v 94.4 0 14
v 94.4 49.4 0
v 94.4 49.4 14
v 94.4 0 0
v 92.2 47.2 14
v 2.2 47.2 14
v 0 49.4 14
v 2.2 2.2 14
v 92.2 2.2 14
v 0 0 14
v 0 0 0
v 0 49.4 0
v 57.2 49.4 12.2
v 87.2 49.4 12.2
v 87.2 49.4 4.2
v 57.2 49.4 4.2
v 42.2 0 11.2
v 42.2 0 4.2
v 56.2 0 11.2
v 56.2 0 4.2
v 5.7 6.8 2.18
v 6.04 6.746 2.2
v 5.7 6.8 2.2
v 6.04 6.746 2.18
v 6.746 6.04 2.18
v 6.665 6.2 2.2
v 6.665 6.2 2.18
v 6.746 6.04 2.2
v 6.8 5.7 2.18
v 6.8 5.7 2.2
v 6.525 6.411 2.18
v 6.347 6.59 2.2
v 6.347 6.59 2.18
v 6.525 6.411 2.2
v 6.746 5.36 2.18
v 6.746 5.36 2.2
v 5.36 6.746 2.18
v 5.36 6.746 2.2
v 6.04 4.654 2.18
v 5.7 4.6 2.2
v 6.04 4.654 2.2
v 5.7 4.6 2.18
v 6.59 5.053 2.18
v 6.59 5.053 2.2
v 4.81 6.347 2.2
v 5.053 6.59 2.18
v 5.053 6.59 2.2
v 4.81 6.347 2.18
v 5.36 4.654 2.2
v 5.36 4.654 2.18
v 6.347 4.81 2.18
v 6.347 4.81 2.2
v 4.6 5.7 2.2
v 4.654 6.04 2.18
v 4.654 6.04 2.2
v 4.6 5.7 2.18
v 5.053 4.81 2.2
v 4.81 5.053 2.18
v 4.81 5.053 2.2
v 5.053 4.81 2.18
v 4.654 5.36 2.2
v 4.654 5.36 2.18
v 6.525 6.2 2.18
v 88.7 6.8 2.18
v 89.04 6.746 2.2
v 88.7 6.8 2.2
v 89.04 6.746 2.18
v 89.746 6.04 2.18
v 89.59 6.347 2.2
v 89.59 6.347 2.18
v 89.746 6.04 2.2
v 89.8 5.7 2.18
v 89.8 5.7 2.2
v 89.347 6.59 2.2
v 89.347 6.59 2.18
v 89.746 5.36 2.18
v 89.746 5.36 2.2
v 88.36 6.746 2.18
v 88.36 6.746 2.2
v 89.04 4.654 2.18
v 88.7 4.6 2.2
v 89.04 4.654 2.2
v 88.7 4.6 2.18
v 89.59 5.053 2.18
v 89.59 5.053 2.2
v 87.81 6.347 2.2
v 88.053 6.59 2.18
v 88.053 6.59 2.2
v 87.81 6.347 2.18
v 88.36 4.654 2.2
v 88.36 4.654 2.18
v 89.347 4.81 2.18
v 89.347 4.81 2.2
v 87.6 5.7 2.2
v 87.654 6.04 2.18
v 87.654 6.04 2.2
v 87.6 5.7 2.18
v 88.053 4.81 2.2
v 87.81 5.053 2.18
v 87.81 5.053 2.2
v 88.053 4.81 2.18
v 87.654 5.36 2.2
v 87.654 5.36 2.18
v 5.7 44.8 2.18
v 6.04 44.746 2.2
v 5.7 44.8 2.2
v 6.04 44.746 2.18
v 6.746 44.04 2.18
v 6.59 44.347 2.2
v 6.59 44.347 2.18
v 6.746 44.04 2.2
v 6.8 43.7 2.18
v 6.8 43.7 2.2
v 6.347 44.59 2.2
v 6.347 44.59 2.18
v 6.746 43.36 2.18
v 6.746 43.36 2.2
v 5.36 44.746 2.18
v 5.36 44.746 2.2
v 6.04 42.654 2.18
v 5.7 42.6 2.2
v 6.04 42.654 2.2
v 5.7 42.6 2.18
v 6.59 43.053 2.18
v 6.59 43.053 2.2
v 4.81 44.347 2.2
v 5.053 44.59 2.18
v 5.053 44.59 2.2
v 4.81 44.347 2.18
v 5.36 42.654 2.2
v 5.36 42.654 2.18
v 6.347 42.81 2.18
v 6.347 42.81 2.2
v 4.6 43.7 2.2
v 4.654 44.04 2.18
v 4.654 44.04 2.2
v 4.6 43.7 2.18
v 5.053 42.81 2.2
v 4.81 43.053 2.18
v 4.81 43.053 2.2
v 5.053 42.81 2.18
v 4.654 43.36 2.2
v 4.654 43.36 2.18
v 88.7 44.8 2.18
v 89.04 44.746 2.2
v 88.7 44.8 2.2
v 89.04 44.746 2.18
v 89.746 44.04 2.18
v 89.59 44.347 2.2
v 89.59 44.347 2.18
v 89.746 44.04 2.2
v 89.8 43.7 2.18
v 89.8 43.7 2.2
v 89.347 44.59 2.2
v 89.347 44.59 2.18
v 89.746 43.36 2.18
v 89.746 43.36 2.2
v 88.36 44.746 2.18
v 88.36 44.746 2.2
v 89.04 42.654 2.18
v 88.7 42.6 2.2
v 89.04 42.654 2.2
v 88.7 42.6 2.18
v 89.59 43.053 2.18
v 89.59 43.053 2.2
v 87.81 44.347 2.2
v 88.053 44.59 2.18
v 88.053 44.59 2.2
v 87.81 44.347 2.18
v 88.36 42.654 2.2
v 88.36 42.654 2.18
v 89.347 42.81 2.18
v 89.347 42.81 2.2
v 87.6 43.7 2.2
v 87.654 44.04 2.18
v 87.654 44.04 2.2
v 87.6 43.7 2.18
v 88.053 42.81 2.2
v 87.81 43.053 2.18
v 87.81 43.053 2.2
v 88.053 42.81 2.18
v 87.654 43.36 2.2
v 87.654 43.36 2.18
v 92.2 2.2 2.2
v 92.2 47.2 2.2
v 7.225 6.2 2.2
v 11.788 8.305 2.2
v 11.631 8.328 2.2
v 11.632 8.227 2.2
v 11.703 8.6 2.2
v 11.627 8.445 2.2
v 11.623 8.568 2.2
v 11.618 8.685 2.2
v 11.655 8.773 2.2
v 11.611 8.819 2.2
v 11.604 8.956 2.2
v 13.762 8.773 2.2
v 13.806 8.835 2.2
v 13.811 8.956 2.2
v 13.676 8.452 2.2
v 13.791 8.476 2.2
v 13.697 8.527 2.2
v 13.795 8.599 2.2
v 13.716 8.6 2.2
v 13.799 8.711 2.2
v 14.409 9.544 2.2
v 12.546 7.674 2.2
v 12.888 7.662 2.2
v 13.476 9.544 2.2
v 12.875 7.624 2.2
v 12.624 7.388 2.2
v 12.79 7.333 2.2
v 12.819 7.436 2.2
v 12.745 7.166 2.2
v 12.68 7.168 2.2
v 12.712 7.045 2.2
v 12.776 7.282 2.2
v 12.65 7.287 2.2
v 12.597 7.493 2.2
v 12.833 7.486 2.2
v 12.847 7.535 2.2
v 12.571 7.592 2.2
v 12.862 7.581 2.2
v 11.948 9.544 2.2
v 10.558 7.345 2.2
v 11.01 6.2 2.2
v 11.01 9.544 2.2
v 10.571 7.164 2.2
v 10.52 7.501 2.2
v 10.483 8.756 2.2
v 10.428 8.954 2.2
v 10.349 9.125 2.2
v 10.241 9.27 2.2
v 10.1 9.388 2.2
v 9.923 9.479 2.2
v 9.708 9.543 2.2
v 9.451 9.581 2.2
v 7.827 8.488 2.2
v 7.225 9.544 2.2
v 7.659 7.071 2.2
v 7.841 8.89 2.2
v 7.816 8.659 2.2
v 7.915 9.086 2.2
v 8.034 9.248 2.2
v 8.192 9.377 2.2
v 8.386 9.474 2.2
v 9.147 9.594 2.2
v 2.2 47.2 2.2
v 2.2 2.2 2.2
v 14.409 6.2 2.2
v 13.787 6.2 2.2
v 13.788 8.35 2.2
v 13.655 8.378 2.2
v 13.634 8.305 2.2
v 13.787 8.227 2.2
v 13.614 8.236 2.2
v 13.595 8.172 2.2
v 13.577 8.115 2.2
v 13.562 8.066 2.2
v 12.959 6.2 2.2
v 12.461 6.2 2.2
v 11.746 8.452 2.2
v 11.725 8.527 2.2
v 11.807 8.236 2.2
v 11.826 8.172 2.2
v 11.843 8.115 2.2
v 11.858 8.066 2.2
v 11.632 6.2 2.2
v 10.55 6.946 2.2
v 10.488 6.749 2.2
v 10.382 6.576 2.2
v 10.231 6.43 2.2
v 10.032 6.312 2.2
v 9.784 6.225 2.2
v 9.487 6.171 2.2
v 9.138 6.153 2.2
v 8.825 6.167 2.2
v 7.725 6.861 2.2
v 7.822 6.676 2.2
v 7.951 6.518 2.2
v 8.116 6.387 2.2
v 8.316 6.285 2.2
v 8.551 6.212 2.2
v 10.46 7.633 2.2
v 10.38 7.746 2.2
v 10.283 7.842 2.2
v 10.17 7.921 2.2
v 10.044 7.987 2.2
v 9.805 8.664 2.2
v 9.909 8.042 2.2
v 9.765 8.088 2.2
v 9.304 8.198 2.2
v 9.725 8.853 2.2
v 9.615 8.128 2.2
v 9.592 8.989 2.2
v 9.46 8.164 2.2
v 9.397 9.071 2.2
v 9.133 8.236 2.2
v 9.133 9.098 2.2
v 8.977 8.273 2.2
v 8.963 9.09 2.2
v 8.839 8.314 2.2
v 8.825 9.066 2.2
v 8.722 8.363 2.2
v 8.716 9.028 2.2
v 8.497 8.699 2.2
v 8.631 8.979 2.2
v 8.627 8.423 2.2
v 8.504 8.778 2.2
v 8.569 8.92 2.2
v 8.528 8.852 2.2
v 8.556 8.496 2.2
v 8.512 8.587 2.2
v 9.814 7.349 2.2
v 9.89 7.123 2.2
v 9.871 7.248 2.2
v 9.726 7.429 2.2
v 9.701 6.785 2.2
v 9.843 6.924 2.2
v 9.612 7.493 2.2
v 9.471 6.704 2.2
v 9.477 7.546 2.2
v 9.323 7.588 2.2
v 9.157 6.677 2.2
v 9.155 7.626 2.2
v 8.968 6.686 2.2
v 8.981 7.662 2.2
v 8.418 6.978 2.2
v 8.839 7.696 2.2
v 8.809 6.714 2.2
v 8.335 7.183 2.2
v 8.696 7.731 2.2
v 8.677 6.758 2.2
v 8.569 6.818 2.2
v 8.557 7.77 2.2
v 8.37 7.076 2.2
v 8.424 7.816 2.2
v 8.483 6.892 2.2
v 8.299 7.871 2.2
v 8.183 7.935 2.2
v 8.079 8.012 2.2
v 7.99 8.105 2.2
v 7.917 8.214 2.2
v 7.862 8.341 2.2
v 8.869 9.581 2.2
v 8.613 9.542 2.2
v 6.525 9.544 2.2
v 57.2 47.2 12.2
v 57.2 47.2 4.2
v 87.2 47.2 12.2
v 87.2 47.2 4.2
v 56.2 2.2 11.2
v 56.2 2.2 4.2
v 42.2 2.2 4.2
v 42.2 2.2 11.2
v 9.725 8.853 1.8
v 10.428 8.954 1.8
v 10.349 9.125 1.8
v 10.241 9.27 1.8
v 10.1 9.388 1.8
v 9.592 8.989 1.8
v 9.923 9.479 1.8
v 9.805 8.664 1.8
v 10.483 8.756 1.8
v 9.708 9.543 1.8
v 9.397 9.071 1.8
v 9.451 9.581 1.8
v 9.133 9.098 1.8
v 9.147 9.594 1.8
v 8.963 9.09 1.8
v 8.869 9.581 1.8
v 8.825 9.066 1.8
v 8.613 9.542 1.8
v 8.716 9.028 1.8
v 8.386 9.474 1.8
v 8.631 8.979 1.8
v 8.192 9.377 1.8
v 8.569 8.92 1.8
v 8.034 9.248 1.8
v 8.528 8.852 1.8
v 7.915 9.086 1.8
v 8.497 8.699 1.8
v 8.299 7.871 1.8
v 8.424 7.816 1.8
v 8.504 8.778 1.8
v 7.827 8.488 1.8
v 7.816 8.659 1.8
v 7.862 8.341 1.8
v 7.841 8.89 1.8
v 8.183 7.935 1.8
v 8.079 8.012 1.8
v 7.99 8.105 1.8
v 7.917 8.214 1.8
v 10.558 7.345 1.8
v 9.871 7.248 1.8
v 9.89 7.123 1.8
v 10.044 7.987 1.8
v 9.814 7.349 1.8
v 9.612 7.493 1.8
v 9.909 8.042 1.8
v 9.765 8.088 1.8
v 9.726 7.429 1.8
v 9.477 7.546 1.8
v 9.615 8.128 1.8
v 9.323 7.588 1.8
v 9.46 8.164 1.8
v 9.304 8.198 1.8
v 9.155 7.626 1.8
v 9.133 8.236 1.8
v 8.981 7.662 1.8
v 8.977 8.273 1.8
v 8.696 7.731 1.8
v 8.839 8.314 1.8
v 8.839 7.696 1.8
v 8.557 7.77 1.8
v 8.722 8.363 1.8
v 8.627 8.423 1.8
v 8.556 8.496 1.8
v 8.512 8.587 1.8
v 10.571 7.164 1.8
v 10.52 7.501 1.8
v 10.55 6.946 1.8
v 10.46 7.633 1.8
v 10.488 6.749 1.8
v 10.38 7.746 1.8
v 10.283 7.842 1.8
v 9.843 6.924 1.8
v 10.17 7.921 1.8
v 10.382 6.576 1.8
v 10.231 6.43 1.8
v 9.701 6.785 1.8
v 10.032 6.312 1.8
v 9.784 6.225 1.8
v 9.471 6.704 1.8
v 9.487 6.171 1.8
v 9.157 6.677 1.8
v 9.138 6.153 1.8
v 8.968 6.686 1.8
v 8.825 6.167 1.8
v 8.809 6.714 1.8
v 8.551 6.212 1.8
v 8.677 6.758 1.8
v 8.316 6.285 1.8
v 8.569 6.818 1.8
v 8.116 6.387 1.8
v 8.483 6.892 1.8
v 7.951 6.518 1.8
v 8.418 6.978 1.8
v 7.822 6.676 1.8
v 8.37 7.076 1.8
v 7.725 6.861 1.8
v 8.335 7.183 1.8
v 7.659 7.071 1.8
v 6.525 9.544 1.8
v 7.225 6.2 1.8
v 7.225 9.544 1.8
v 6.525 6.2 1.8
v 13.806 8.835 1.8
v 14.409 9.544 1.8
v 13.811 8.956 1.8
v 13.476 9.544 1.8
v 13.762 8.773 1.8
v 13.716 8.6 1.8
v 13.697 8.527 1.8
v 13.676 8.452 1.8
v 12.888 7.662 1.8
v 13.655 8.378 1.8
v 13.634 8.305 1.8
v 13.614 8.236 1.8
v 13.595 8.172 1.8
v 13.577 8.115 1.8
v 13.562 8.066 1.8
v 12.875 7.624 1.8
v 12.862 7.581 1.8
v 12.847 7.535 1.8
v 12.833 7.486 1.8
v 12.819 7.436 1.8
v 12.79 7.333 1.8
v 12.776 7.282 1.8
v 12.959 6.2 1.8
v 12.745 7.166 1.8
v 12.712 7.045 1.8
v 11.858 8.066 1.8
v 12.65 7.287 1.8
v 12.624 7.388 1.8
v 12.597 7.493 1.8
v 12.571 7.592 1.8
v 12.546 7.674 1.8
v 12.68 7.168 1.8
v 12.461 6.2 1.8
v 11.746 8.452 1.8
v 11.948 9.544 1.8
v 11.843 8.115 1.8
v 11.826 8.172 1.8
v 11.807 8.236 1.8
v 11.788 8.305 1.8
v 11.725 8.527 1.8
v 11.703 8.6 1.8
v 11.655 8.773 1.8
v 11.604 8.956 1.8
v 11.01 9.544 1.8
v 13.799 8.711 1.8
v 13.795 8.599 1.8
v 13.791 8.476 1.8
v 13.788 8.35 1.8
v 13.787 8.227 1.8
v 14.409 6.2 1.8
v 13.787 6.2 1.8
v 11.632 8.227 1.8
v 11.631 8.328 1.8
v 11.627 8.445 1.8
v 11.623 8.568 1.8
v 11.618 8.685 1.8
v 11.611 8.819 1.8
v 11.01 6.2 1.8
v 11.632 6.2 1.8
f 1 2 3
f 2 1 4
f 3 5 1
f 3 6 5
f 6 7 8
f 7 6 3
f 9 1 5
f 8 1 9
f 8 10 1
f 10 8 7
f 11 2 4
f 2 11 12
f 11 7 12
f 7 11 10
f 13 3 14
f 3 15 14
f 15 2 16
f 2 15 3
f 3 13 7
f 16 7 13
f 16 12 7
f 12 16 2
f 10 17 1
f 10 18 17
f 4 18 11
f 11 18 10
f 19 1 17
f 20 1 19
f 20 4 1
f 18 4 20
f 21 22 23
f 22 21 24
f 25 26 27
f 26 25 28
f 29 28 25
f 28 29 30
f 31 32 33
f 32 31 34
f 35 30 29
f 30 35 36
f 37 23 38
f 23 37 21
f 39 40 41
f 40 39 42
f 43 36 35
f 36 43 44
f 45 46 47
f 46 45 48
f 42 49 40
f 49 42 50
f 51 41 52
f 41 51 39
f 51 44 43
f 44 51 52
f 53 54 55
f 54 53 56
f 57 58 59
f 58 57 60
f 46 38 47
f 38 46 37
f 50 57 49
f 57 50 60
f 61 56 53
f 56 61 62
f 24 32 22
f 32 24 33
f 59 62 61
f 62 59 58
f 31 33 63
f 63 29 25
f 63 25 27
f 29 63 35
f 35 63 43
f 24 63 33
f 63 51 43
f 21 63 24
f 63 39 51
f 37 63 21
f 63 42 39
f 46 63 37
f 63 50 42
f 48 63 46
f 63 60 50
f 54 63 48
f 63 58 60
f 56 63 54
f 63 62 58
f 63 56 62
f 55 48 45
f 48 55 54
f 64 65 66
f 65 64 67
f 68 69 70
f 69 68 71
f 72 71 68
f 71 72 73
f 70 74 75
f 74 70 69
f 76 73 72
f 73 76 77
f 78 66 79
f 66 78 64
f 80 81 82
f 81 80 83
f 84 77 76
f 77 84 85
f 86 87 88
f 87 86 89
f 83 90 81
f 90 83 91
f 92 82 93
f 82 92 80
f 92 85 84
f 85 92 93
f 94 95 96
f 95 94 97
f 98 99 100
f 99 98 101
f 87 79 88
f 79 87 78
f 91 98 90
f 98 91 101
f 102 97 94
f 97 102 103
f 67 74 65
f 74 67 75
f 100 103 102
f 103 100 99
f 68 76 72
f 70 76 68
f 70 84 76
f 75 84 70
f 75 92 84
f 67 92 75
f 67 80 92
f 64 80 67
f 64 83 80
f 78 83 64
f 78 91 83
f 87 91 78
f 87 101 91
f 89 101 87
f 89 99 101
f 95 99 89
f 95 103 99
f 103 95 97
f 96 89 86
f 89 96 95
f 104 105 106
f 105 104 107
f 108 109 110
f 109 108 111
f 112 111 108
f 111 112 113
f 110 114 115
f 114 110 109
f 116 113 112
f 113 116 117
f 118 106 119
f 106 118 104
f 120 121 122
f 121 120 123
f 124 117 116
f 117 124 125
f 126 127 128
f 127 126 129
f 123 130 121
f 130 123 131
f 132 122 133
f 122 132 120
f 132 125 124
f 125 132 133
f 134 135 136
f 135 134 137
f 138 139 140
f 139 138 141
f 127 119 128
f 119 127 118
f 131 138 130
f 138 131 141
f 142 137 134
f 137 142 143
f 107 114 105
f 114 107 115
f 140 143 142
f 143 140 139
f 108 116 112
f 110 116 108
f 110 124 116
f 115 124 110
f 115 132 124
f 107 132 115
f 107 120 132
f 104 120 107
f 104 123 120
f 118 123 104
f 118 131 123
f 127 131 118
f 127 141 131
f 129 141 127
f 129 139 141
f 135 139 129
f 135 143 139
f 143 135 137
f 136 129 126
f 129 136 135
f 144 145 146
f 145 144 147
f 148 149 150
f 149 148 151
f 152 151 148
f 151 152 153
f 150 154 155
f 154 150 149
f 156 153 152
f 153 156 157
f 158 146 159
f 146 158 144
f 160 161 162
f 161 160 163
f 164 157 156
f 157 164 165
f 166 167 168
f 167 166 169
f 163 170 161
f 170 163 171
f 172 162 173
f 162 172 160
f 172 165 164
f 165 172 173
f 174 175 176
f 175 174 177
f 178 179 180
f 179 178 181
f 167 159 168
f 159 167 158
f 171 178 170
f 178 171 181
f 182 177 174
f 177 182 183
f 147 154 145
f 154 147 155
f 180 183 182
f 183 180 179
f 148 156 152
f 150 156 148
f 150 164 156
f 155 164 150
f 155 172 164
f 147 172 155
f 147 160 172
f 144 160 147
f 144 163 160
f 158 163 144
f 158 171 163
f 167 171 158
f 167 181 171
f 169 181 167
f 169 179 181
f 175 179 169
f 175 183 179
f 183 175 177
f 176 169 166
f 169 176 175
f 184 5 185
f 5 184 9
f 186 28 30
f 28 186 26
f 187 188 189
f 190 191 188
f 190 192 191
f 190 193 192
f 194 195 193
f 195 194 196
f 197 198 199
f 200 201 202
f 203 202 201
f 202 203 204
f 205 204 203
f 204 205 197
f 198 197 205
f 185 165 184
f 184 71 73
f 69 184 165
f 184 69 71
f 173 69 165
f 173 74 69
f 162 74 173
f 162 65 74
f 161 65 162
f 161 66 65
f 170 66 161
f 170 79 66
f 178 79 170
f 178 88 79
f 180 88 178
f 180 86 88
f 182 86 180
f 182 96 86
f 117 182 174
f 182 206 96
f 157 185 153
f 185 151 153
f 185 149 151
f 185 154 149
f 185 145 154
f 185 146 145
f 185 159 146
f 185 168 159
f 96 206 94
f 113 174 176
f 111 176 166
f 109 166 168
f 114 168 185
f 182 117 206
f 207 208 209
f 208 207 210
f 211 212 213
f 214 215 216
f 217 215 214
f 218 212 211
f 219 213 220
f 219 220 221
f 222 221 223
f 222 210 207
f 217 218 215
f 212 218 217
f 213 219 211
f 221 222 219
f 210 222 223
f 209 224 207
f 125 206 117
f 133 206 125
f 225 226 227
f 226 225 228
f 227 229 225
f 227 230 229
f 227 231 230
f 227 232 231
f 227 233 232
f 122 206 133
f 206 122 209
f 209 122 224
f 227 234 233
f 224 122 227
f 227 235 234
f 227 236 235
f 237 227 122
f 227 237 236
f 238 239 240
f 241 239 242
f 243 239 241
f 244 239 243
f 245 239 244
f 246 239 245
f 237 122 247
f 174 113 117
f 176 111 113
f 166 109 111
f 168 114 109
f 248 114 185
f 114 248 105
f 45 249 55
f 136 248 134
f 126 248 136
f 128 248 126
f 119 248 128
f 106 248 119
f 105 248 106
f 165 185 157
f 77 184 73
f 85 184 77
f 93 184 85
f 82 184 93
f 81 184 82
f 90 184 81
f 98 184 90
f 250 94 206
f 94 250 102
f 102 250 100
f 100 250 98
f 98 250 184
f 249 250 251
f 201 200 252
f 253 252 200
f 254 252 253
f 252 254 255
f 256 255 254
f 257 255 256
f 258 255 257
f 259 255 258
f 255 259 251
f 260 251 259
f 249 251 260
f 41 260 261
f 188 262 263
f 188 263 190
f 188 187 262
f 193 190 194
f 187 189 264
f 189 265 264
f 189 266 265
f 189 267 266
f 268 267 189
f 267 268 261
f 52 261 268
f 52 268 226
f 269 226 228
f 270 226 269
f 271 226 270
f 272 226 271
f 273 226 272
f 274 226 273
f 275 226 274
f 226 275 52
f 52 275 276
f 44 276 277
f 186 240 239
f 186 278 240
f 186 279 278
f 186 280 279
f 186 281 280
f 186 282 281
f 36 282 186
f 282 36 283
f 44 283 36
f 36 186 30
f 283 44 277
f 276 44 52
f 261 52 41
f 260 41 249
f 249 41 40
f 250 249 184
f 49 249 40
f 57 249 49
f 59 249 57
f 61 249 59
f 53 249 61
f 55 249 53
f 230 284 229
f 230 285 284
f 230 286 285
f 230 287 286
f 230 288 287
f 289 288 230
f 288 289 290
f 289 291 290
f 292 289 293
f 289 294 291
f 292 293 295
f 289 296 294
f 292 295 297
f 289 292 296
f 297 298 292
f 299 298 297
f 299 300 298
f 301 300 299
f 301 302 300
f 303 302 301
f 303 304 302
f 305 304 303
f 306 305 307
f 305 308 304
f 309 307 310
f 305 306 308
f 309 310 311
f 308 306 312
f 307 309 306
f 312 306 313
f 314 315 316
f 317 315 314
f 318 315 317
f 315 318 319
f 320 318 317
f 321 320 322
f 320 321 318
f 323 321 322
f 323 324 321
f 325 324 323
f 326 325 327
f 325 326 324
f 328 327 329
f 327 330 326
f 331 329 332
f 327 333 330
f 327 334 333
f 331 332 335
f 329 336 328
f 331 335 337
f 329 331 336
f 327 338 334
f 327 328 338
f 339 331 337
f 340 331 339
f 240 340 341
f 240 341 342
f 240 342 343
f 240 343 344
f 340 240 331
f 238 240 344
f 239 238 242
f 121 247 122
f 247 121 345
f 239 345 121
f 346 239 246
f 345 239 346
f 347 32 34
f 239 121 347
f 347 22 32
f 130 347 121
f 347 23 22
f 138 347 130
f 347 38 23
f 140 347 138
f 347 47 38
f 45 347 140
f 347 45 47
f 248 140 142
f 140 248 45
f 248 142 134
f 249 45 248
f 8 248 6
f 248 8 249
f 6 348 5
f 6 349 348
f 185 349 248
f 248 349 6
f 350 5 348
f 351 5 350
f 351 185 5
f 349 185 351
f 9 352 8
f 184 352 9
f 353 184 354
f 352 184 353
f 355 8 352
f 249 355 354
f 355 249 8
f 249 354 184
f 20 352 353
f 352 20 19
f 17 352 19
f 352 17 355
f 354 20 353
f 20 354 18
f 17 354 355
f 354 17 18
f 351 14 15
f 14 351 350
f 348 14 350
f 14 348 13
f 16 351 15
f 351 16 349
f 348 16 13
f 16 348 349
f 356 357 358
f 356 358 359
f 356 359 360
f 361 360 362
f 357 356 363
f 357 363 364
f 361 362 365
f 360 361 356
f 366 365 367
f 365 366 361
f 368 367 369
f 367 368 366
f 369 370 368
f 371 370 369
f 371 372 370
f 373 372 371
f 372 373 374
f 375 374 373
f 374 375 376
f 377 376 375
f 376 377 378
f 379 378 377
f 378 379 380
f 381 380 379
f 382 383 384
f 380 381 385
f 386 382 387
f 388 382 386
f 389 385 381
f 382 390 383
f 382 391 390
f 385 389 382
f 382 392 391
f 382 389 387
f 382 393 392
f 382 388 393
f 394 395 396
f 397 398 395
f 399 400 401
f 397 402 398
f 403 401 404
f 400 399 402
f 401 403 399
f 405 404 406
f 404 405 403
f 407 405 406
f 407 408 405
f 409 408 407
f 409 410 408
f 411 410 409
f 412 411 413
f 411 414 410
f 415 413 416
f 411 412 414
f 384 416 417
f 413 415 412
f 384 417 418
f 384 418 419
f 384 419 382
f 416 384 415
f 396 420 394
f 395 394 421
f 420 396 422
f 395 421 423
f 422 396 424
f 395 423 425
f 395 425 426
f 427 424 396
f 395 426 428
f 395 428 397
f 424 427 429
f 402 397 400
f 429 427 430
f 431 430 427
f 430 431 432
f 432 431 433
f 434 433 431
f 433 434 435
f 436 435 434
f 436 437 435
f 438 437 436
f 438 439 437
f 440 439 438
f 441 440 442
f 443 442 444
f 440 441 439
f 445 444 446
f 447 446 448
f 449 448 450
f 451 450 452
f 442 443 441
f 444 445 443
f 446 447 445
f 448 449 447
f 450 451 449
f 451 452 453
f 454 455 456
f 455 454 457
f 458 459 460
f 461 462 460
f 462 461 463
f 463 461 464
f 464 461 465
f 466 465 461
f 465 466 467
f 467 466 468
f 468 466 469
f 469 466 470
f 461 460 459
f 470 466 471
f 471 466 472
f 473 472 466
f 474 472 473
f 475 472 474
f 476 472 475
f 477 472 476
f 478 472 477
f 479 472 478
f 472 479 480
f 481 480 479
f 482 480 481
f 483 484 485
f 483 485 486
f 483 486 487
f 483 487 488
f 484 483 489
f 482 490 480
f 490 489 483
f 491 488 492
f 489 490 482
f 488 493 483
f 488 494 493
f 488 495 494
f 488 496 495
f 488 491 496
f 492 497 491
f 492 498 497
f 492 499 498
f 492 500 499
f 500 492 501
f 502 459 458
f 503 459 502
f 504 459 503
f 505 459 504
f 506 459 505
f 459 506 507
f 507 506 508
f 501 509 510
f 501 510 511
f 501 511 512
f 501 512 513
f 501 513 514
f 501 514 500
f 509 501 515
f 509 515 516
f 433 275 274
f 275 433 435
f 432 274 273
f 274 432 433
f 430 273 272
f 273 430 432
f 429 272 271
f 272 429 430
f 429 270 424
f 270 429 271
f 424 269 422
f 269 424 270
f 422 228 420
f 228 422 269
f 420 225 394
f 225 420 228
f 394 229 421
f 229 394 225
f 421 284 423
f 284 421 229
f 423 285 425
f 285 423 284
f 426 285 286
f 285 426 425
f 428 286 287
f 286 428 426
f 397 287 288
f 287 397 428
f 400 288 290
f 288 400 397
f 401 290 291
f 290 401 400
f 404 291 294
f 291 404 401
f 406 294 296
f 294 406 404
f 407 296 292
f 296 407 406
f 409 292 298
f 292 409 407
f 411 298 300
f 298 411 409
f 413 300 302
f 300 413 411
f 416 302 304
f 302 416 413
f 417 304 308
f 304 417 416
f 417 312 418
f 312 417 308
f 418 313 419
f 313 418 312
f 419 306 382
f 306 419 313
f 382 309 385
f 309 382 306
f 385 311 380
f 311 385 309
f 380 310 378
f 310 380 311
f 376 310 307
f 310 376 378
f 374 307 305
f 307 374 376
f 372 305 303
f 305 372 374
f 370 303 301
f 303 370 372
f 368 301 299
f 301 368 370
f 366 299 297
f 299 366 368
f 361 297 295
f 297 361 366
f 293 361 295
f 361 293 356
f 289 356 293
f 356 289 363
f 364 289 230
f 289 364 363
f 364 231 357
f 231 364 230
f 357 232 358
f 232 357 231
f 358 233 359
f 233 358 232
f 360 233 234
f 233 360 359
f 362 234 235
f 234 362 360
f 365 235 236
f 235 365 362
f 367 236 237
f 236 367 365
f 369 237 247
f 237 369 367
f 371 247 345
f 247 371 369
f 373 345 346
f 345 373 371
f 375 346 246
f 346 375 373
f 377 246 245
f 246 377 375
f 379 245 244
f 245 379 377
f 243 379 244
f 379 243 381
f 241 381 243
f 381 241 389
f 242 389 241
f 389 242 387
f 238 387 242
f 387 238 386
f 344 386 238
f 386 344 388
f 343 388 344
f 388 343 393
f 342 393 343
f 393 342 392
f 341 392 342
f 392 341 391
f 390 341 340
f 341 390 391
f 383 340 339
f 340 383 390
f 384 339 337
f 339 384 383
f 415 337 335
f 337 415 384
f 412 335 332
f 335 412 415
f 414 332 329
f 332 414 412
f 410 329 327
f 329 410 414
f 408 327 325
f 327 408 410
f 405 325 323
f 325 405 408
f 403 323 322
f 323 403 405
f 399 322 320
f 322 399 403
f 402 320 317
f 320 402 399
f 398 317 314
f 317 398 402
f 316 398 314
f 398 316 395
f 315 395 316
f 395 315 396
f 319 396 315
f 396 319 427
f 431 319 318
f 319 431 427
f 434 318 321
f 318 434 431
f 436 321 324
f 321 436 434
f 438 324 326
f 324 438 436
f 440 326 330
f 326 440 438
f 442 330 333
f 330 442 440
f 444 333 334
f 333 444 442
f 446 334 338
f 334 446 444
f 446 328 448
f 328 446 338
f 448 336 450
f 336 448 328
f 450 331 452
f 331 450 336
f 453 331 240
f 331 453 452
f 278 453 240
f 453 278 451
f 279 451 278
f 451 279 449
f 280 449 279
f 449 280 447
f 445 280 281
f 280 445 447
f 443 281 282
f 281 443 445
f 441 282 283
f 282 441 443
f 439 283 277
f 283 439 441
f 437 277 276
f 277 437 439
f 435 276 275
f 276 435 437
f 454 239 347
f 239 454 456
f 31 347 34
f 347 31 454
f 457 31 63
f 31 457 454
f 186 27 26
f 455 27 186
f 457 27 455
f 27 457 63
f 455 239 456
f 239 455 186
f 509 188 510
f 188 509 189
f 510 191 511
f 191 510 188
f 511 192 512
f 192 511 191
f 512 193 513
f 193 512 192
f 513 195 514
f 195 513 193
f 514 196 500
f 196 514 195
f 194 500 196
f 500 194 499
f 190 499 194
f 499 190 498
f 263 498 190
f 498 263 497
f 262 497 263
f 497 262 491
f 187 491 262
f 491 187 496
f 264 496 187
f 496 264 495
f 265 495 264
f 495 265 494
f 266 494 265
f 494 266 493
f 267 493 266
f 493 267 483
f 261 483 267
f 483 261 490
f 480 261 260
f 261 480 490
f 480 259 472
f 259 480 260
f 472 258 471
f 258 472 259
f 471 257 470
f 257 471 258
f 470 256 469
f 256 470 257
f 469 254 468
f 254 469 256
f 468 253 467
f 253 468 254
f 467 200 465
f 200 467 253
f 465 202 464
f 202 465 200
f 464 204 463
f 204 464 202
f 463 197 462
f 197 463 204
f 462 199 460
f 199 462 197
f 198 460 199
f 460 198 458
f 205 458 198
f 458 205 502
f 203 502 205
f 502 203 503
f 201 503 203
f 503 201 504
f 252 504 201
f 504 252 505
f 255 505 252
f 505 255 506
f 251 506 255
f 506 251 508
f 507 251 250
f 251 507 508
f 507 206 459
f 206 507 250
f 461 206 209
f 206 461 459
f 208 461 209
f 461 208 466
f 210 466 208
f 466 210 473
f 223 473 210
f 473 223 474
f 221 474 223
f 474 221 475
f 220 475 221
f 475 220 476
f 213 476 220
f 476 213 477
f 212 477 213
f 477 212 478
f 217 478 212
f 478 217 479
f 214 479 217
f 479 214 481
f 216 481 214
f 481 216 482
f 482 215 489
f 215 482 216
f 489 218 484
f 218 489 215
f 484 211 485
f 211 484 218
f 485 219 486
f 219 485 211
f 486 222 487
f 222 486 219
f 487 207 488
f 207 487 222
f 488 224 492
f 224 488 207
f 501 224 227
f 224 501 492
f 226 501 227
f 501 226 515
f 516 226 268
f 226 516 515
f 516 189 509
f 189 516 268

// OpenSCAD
// ISM SCSI / SCSI carrier shell (original ISM) — 2.5" bay style
pcb_w = 90;
pcb_d = 45;
wall = 2.2;
box_h = 14;
eps = 0.02;
mount_d = 2.2;
badge_depth = 0.4;

mounts = [[3.5, 3.5], [pcb_w - 3.5, 3.5], [3.5, pcb_d - 3.5], [pcb_w - 3.5, pcb_d - 3.5]];

module carrier() {
  difference() {
    union() {
      cube([pcb_w + 2 * wall, pcb_d + 2 * wall, box_h]);
      for (p = mounts)
        translate([p[0] + wall, p[1] + wall, wall - eps])
          cylinder(h = 4 + eps, d = 5, $fn = 24);
    }
    translate([wall, wall, wall])
      cube([pcb_w, pcb_d, box_h - wall + eps]);
    // USB-C
    translate([wall + 40, -eps, wall + 2])
      cube([14, wall + 4, 7]);
    // SCSI ribbon / drive bay opening
    translate([wall + 55, wall + pcb_d - 1, wall + 2])
      cube([30, wall + 3, 8]);
    // Drive power header
    translate([wall + 72, wall + pcb_d - 1, wall + 4])
      cube([12, wall + 3, 6]);
    for (p = mounts)
      translate([p[0] + wall, p[1] + wall, wall - eps])
        cylinder(h = 8 + 2 * eps, d = mount_d, $fn = 20);
    translate([wall + 4, wall + 4, wall - badge_depth])
      linear_extrude(height = badge_depth + eps)
        text("ISM", size = 3.5, font = "Liberation Sans:style=Bold");
  }
}

module lid() {
  difference() {
    cube([pcb_w + 2 * wall, pcb_d + 2 * wall, 2.5]);
    translate([4, 4, 2.5 - badge_depth])
      linear_extrude(height = badge_depth + eps)
        text("SCSI", size = 4, font = "Liberation Sans:style=Bold");
  }
}

carrier();
